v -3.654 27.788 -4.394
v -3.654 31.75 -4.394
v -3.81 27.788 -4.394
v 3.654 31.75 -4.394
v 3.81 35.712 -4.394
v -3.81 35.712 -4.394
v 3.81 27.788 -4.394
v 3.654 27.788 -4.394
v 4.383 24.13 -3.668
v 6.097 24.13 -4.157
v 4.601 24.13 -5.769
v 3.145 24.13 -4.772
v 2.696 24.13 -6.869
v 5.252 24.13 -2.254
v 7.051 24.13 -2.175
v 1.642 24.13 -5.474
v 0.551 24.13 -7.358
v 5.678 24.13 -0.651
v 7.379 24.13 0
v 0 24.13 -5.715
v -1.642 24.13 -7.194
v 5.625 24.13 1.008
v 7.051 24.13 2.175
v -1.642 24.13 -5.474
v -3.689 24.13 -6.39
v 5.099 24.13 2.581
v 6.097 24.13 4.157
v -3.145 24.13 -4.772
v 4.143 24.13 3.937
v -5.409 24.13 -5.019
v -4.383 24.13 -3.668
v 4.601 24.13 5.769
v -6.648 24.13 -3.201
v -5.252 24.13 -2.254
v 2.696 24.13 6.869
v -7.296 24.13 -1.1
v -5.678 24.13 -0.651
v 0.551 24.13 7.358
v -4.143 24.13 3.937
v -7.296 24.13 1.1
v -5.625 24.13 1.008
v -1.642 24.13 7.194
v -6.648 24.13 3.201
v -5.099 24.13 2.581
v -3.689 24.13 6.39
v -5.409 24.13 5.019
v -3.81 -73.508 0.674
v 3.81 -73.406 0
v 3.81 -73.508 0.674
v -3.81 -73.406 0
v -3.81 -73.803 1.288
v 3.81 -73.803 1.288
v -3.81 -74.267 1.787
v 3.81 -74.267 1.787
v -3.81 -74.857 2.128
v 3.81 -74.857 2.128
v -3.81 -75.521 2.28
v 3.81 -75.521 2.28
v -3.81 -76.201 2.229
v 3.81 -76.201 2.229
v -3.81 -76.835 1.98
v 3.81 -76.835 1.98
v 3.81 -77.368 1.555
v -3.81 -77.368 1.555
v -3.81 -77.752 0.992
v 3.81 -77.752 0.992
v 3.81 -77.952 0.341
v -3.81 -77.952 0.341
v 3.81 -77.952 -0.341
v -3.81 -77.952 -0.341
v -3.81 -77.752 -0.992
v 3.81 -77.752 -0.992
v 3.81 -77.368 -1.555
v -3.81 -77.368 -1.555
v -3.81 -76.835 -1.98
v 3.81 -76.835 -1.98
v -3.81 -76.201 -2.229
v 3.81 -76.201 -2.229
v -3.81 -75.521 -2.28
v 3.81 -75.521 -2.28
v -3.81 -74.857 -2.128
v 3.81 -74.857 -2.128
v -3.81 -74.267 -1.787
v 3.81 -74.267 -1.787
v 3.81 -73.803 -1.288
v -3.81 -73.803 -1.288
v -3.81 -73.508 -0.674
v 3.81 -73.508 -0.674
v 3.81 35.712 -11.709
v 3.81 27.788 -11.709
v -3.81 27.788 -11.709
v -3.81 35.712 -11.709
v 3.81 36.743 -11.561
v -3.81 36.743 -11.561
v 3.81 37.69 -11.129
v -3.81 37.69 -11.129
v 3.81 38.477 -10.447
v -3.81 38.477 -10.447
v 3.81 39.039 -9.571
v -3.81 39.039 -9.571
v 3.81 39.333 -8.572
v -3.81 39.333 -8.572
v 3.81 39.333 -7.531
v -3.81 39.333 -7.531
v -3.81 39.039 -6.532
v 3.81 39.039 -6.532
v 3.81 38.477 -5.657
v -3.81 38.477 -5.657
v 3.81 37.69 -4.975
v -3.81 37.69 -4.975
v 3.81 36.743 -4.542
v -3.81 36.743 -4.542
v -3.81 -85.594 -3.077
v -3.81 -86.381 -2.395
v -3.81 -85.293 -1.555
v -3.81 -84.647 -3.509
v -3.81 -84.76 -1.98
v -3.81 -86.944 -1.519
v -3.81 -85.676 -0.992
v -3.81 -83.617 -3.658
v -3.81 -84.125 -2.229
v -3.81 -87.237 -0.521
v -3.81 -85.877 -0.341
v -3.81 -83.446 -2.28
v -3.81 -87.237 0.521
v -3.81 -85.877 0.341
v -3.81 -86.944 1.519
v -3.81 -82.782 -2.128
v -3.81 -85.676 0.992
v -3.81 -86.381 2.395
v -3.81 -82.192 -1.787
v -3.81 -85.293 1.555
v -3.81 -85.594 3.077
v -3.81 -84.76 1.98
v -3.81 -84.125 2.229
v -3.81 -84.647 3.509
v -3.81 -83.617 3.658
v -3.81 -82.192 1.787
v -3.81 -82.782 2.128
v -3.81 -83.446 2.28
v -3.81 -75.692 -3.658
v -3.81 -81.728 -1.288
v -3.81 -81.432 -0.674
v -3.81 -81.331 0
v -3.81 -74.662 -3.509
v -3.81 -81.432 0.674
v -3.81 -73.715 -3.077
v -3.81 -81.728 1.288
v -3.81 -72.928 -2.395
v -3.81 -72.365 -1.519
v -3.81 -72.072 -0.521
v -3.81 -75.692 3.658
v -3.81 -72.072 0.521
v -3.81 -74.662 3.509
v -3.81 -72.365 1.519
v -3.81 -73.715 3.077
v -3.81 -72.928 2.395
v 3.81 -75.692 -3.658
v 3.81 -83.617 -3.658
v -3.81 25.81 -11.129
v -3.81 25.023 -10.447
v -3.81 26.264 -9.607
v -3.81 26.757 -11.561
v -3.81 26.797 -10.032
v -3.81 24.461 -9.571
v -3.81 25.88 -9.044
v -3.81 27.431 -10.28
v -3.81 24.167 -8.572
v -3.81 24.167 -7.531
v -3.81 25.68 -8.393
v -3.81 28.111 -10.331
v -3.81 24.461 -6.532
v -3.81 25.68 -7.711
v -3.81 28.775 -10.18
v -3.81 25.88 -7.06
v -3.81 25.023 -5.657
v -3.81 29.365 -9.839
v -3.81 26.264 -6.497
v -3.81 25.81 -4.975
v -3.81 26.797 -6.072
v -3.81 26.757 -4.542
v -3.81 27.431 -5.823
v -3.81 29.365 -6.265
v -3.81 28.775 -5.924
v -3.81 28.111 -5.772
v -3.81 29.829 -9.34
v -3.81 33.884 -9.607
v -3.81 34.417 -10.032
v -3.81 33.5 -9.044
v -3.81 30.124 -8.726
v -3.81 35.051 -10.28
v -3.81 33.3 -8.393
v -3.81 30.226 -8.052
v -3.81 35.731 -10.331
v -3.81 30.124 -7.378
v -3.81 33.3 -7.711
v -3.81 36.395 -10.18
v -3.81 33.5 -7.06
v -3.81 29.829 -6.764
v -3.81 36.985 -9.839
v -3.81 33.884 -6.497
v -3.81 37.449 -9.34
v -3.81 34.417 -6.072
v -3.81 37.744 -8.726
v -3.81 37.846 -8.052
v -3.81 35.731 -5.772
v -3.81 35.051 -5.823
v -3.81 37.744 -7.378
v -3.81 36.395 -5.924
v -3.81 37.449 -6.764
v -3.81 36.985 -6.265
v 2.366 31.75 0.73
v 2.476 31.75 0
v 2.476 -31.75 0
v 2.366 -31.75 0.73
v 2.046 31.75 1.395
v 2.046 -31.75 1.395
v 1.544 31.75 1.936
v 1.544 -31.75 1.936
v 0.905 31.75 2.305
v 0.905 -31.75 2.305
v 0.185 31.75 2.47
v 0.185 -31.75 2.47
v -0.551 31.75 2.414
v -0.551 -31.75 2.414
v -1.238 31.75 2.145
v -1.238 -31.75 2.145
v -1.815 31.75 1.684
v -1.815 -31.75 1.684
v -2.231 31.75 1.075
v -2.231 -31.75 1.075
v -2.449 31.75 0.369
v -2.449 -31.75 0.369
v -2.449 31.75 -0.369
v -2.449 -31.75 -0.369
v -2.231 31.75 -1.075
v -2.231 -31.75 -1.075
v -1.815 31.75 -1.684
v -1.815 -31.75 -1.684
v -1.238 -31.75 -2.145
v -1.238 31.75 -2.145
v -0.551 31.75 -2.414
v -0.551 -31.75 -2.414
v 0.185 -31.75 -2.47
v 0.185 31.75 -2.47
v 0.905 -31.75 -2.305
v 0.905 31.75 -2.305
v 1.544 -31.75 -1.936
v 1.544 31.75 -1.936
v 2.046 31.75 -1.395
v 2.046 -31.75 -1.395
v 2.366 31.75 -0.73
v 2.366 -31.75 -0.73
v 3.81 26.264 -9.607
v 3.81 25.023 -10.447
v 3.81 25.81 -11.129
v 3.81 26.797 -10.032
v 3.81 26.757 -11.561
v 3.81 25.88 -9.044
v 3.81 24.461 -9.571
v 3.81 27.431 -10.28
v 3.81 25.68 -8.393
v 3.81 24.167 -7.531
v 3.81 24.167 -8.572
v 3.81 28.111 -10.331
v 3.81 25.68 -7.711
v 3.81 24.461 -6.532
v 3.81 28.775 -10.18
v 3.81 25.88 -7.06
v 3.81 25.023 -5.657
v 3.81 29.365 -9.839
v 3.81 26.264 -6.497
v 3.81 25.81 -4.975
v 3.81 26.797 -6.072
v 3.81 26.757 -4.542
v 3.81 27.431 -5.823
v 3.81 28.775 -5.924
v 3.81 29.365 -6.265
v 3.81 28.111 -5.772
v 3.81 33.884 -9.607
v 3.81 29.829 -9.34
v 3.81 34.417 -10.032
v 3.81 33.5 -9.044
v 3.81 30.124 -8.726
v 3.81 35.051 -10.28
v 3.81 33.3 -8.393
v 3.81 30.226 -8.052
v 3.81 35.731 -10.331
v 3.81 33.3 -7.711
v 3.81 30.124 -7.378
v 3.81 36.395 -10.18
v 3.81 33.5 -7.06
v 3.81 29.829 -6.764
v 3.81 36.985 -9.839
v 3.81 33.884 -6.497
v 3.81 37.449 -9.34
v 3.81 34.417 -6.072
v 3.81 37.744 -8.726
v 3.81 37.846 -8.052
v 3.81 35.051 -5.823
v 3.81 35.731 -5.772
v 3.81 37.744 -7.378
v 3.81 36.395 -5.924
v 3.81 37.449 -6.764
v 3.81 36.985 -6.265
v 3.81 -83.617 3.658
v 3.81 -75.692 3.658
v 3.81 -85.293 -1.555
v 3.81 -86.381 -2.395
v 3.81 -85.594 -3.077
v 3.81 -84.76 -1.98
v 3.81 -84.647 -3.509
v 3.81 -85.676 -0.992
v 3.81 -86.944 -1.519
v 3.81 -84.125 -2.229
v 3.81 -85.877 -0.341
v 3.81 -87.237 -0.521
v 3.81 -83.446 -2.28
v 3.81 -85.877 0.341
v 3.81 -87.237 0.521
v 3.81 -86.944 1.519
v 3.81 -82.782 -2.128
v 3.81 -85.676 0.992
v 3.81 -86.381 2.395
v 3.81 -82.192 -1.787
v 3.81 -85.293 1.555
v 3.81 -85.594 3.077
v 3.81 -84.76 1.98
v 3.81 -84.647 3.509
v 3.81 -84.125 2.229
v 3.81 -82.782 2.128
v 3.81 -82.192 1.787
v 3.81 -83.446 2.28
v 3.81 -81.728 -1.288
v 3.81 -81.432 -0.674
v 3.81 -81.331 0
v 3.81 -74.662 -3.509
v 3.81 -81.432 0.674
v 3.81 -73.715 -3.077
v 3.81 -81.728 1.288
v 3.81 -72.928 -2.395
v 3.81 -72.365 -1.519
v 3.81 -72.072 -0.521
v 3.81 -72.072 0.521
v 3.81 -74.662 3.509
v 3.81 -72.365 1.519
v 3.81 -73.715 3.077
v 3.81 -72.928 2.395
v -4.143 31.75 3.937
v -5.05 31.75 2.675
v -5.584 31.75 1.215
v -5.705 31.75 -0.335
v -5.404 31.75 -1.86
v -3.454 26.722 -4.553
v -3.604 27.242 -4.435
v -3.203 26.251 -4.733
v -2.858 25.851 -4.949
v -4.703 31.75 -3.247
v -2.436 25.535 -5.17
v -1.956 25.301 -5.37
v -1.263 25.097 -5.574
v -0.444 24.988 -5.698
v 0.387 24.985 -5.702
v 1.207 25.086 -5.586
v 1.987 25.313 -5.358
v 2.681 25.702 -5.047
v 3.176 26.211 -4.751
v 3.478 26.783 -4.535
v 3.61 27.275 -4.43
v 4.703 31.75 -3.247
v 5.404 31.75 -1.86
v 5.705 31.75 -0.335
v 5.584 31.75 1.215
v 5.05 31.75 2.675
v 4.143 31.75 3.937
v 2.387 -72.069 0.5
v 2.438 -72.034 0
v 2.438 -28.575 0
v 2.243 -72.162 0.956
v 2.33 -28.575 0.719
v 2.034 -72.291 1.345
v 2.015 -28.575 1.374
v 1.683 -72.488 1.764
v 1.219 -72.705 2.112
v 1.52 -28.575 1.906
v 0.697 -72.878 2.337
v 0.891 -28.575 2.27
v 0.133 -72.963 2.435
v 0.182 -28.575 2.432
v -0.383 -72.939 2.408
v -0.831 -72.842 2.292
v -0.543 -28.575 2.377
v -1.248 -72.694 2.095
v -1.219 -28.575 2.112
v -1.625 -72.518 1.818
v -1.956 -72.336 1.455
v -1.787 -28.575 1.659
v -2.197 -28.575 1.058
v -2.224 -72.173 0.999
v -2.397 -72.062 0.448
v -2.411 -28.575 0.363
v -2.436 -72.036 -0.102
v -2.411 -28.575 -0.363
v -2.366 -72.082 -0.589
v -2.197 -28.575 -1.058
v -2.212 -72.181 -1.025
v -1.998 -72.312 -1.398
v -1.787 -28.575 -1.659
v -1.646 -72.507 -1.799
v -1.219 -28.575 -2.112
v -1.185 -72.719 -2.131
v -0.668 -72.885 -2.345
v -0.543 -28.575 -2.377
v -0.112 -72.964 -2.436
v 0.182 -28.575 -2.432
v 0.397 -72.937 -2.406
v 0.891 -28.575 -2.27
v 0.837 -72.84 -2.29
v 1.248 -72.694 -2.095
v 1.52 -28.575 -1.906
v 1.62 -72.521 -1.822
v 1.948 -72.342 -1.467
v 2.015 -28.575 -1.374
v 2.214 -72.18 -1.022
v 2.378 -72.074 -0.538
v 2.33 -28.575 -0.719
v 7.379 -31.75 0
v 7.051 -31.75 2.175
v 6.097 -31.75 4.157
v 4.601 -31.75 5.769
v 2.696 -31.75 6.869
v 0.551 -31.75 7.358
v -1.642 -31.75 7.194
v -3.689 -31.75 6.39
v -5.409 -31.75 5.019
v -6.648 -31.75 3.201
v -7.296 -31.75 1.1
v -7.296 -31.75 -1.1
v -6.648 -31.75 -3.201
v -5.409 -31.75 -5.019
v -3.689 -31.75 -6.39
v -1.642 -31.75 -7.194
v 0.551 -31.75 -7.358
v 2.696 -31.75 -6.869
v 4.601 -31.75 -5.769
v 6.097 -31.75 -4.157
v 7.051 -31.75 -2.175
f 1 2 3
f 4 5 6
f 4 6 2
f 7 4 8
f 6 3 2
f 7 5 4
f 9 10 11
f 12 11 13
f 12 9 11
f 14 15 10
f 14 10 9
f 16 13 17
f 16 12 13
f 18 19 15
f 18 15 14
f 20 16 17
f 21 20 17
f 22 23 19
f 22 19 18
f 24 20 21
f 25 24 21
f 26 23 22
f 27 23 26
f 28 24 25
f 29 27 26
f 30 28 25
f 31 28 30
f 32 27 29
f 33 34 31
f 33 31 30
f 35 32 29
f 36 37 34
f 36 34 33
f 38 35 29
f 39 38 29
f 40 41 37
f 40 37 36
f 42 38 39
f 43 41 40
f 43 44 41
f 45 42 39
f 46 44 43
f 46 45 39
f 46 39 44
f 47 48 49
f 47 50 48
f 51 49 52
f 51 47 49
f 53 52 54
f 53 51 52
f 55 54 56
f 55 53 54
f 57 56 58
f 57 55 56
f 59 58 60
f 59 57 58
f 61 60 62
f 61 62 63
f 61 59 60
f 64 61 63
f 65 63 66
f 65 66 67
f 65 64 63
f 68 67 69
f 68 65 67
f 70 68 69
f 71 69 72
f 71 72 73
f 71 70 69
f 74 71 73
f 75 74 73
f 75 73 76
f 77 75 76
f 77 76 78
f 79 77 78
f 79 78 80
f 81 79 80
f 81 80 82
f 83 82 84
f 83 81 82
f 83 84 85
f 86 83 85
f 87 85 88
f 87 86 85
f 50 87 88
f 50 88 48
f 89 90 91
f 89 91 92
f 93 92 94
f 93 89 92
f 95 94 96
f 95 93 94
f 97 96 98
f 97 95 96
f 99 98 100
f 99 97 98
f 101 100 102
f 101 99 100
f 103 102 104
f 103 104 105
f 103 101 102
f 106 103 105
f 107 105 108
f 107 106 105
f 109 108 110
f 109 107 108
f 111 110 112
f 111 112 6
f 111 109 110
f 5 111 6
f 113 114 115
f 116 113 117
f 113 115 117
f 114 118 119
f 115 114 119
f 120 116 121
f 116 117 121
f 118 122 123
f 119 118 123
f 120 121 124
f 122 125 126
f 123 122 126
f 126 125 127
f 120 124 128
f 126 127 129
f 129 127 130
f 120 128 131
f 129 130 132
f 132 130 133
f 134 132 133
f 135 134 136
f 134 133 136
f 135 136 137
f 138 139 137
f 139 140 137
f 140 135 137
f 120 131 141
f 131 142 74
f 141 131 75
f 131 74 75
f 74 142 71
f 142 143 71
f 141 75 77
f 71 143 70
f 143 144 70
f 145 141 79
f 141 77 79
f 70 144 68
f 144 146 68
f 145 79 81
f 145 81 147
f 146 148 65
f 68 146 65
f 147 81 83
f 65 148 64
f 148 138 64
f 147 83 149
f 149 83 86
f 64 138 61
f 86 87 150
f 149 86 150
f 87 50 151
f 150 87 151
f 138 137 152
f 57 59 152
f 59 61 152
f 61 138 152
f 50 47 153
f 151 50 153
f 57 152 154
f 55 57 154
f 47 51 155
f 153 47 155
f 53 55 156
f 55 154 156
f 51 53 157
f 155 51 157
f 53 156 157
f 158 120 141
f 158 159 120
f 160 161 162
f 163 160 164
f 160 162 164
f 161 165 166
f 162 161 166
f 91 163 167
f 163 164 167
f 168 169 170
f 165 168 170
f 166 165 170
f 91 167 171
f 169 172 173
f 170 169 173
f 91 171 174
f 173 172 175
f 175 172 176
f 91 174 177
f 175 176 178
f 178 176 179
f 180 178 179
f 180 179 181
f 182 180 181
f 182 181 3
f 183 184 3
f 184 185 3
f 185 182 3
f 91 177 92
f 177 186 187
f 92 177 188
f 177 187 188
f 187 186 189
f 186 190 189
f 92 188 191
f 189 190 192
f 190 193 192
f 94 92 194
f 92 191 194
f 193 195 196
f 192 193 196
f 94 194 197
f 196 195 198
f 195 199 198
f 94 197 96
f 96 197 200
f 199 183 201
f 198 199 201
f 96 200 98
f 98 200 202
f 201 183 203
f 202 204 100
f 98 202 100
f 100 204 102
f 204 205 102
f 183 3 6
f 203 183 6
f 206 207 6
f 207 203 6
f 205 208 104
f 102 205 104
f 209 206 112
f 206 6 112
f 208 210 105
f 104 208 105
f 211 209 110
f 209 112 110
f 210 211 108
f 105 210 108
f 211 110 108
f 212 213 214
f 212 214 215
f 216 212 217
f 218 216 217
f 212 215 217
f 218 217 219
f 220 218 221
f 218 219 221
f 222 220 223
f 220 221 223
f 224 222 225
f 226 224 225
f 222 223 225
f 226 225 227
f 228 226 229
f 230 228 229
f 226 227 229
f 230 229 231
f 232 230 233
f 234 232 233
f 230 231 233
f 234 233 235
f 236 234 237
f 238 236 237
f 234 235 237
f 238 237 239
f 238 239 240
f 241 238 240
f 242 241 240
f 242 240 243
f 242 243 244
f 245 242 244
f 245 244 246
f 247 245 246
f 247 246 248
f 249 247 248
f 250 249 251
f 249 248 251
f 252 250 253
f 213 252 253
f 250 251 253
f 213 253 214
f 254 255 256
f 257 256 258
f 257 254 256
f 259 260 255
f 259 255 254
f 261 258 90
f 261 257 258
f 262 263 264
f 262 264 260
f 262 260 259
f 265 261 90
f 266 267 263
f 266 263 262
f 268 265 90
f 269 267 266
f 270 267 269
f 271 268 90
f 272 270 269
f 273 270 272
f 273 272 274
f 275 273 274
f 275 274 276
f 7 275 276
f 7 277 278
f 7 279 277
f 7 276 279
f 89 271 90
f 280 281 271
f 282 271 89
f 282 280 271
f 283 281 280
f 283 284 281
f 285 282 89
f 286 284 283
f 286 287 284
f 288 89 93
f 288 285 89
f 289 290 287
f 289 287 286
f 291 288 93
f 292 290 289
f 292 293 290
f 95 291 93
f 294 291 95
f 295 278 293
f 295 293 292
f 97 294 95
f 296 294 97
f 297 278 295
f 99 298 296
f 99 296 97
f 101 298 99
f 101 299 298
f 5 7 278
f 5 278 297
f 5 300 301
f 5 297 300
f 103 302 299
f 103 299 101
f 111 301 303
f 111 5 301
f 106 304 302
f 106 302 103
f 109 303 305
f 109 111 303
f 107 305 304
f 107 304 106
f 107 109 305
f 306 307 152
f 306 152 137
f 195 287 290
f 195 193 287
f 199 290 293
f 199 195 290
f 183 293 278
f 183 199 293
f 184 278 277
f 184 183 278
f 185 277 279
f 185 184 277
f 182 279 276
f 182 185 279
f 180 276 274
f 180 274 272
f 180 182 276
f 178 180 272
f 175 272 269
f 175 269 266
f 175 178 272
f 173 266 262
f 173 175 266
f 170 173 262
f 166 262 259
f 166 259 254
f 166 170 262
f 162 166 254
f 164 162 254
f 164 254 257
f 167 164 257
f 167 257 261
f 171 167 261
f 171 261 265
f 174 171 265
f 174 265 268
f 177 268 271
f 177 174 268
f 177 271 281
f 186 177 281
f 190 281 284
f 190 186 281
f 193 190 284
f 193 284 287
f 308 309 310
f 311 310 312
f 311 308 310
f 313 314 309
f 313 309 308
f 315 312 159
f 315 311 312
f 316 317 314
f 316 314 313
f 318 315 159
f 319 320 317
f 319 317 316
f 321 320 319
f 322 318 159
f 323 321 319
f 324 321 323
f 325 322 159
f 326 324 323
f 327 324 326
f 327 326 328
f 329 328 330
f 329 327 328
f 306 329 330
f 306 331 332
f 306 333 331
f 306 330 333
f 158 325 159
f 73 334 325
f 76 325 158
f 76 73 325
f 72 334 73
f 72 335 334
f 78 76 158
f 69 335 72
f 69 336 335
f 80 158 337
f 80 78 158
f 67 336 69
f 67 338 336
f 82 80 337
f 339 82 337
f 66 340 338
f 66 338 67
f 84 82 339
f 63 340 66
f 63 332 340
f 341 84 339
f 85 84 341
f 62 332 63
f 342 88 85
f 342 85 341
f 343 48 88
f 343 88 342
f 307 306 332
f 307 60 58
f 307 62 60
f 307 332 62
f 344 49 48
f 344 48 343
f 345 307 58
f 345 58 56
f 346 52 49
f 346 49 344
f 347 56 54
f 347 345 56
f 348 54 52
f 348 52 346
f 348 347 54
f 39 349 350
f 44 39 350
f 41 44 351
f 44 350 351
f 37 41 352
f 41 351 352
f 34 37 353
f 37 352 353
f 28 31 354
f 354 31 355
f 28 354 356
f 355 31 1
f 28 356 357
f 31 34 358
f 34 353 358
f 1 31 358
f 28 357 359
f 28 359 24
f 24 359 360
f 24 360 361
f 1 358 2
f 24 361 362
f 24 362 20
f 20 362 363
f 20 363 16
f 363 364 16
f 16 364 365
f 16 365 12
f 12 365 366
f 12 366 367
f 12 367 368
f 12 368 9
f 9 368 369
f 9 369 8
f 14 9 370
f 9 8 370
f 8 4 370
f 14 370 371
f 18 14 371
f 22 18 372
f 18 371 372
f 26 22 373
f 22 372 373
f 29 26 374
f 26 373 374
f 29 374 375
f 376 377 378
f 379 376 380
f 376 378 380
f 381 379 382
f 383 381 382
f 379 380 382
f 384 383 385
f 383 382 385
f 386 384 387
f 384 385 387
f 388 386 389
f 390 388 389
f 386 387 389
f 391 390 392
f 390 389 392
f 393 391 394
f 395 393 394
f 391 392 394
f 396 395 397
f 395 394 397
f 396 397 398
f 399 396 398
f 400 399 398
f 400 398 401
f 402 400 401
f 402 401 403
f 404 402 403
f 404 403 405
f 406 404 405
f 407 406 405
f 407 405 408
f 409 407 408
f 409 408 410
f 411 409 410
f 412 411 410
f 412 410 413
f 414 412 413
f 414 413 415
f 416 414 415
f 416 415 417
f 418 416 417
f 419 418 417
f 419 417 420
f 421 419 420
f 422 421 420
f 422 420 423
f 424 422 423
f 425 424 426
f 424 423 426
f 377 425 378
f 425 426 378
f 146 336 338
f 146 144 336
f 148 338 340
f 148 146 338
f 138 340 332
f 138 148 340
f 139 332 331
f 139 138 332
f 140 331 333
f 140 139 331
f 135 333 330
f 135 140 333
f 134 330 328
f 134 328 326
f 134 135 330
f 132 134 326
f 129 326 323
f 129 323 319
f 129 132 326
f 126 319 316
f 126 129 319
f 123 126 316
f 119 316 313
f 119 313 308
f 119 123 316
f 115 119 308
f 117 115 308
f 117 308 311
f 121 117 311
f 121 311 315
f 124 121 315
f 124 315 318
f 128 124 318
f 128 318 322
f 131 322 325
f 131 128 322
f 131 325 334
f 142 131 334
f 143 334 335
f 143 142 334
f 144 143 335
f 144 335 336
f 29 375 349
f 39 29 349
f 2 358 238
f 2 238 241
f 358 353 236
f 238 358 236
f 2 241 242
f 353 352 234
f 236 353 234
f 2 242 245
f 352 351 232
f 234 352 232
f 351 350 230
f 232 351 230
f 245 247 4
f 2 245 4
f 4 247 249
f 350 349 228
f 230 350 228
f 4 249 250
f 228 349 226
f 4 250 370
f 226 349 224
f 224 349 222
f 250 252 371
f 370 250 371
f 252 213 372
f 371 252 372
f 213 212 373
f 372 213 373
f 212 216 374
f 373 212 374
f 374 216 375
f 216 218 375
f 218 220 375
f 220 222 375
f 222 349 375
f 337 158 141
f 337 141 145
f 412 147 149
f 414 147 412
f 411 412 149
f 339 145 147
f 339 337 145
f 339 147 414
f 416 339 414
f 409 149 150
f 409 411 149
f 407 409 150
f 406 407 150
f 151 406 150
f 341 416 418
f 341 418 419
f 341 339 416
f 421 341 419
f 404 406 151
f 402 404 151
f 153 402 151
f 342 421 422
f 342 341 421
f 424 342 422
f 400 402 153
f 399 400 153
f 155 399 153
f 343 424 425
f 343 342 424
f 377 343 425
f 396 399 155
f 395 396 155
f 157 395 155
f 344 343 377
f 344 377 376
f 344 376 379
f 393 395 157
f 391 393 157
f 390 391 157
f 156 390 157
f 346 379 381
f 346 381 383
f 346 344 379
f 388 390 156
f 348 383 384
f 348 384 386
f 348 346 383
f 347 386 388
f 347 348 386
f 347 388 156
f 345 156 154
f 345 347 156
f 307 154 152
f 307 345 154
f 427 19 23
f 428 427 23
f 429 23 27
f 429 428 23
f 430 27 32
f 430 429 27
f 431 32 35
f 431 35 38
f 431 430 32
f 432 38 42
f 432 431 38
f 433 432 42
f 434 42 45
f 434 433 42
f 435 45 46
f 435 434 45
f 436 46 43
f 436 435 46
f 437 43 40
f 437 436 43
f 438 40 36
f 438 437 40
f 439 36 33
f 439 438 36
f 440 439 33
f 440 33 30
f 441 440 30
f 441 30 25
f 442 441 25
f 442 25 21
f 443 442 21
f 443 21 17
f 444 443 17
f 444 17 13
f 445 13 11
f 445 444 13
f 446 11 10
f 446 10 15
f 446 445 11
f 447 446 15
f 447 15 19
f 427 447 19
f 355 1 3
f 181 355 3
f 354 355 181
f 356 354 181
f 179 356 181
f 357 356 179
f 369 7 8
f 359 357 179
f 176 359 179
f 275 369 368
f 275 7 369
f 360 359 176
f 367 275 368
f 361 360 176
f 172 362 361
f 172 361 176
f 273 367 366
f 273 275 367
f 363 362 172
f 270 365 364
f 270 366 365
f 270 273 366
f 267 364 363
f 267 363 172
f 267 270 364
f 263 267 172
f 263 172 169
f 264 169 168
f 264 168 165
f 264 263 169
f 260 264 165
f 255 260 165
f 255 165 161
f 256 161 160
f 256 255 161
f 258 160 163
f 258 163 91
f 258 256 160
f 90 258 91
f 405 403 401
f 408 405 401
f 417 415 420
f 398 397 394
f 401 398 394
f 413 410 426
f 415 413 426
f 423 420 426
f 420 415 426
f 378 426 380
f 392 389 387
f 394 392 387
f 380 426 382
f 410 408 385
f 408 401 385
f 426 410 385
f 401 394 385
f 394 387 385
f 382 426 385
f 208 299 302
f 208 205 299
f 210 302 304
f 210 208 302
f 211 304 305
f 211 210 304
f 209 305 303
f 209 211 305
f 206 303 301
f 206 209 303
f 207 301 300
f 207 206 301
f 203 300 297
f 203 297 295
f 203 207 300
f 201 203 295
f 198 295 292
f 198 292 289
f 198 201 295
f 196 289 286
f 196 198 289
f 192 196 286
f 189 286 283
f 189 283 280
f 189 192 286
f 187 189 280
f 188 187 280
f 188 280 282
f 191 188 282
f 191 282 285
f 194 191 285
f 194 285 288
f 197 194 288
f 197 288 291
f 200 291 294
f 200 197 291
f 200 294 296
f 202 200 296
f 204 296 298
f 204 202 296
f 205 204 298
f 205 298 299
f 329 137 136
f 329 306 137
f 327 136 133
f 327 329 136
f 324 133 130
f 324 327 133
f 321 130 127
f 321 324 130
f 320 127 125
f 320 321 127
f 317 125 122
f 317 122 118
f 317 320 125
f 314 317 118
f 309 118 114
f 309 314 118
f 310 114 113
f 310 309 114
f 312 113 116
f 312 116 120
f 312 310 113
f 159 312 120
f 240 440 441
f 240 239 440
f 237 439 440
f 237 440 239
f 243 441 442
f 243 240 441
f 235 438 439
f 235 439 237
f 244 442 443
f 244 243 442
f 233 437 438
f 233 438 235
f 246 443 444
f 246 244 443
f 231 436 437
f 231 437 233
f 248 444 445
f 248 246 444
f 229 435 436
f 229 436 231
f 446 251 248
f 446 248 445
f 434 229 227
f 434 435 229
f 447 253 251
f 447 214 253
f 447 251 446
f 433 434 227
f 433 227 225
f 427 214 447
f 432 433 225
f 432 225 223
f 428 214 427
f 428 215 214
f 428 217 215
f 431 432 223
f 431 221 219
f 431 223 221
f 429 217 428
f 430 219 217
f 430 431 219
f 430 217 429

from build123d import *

# Parameters (mm, degrees)
F1_R      = 7.3787
F2_DEPTH  = 31.75
F3_R      = 2.4765
F4_DEPTH  = 63.5
F5_R      = 7.3787
F6_DEPTH  = 7.62
F7_R      = 2.286
F8_DEPTH  = 3.81
F9_R      = 2.286
F10_DEPTH = 3.81
F11_R     = 2.4384


with BuildPart() as f2:
    # F1 (on Front) → F2 (new body, symmetric)
    with BuildSketch(Plane.XZ):
        Circle(F1_R)
    extrude(amount=F2_DEPTH, both=True)

    # F3 (on face) → F4 (cut, through all)
    with BuildSketch(Plane.XZ.offset(31.75)):
        Circle(F3_R)
    extrude(amount=-F4_DEPTH, mode=Mode.SUBTRACT)

    # F5 (on face) → F6 (cut)
    with BuildSketch(Plane(origin=(0, 31.75, 0), x_dir=(-1, 0, 0), z_dir=(0, 1, 0))):
        Circle(F5_R)
        with BuildLine():
            ThreePointArc((4.1426146333, 3.937), (0, -5.715), (-4.1426146333, 3.937))
            Line((-4.1426146333, 3.937), (4.1426146333, 3.937))
        make_face(mode=Mode.SUBTRACT)
    extrude(amount=-F6_DEPTH, mode=Mode.SUBTRACT)

    # F7 (on Right) → F8 (join, symmetric)
    with BuildSketch(Plane.YZ):
        with BuildLine():
            Line((35.7124, -4.3942), (27.7876, -4.3942))
            ThreePointArc((27.7876, -4.3942), (24.13, -8.0518), (27.7876, -11.7094))
            Line((27.7876, -11.7094), (35.7124, -11.7094))
            ThreePointArc((35.7124, -11.7094), (39.37, -8.0518), (35.7124, -4.3942))
        make_face()
        with Locations((27.94, -8.0518)):
            Circle(F7_R, mode=Mode.SUBTRACT)
        with Locations((35.56, -8.0518)):
            Circle(F7_R, mode=Mode.SUBTRACT)
    extrude(amount=F8_DEPTH, both=True)


with BuildPart() as f10:
    # F9 (on Right) → F10 (new body, symmetric)
    with BuildSketch(Plane.YZ):
        with BuildLine():
            Line((-83.6168, -3.6576), (-75.692, -3.6576))
            ThreePointArc((-75.692, -3.6576), (-72.0344, 0), (-75.692, 3.6576))
            Line((-75.692, 3.6576), (-83.6168, 3.6576))
            ThreePointArc((-83.6168, 3.6576), (-87.2744, 0), (-83.6168, -3.6576))
        make_face()
        with Locations((-83.6168, 0)):
            Circle(F9_R, mode=Mode.SUBTRACT)
        with Locations((-75.692, 0)):
            Circle(F9_R, mode=Mode.SUBTRACT)
    extrude(amount=F10_DEPTH, both=True)

    # F11 (on offset) → F12 (join, up to the next surface of F10)
    with BuildSketch(Plane.XZ.offset(28.575)):
        Circle(F11_R)
    extrude(until=Until.NEXT)


solid = Compound([f2.part, f10.part])
